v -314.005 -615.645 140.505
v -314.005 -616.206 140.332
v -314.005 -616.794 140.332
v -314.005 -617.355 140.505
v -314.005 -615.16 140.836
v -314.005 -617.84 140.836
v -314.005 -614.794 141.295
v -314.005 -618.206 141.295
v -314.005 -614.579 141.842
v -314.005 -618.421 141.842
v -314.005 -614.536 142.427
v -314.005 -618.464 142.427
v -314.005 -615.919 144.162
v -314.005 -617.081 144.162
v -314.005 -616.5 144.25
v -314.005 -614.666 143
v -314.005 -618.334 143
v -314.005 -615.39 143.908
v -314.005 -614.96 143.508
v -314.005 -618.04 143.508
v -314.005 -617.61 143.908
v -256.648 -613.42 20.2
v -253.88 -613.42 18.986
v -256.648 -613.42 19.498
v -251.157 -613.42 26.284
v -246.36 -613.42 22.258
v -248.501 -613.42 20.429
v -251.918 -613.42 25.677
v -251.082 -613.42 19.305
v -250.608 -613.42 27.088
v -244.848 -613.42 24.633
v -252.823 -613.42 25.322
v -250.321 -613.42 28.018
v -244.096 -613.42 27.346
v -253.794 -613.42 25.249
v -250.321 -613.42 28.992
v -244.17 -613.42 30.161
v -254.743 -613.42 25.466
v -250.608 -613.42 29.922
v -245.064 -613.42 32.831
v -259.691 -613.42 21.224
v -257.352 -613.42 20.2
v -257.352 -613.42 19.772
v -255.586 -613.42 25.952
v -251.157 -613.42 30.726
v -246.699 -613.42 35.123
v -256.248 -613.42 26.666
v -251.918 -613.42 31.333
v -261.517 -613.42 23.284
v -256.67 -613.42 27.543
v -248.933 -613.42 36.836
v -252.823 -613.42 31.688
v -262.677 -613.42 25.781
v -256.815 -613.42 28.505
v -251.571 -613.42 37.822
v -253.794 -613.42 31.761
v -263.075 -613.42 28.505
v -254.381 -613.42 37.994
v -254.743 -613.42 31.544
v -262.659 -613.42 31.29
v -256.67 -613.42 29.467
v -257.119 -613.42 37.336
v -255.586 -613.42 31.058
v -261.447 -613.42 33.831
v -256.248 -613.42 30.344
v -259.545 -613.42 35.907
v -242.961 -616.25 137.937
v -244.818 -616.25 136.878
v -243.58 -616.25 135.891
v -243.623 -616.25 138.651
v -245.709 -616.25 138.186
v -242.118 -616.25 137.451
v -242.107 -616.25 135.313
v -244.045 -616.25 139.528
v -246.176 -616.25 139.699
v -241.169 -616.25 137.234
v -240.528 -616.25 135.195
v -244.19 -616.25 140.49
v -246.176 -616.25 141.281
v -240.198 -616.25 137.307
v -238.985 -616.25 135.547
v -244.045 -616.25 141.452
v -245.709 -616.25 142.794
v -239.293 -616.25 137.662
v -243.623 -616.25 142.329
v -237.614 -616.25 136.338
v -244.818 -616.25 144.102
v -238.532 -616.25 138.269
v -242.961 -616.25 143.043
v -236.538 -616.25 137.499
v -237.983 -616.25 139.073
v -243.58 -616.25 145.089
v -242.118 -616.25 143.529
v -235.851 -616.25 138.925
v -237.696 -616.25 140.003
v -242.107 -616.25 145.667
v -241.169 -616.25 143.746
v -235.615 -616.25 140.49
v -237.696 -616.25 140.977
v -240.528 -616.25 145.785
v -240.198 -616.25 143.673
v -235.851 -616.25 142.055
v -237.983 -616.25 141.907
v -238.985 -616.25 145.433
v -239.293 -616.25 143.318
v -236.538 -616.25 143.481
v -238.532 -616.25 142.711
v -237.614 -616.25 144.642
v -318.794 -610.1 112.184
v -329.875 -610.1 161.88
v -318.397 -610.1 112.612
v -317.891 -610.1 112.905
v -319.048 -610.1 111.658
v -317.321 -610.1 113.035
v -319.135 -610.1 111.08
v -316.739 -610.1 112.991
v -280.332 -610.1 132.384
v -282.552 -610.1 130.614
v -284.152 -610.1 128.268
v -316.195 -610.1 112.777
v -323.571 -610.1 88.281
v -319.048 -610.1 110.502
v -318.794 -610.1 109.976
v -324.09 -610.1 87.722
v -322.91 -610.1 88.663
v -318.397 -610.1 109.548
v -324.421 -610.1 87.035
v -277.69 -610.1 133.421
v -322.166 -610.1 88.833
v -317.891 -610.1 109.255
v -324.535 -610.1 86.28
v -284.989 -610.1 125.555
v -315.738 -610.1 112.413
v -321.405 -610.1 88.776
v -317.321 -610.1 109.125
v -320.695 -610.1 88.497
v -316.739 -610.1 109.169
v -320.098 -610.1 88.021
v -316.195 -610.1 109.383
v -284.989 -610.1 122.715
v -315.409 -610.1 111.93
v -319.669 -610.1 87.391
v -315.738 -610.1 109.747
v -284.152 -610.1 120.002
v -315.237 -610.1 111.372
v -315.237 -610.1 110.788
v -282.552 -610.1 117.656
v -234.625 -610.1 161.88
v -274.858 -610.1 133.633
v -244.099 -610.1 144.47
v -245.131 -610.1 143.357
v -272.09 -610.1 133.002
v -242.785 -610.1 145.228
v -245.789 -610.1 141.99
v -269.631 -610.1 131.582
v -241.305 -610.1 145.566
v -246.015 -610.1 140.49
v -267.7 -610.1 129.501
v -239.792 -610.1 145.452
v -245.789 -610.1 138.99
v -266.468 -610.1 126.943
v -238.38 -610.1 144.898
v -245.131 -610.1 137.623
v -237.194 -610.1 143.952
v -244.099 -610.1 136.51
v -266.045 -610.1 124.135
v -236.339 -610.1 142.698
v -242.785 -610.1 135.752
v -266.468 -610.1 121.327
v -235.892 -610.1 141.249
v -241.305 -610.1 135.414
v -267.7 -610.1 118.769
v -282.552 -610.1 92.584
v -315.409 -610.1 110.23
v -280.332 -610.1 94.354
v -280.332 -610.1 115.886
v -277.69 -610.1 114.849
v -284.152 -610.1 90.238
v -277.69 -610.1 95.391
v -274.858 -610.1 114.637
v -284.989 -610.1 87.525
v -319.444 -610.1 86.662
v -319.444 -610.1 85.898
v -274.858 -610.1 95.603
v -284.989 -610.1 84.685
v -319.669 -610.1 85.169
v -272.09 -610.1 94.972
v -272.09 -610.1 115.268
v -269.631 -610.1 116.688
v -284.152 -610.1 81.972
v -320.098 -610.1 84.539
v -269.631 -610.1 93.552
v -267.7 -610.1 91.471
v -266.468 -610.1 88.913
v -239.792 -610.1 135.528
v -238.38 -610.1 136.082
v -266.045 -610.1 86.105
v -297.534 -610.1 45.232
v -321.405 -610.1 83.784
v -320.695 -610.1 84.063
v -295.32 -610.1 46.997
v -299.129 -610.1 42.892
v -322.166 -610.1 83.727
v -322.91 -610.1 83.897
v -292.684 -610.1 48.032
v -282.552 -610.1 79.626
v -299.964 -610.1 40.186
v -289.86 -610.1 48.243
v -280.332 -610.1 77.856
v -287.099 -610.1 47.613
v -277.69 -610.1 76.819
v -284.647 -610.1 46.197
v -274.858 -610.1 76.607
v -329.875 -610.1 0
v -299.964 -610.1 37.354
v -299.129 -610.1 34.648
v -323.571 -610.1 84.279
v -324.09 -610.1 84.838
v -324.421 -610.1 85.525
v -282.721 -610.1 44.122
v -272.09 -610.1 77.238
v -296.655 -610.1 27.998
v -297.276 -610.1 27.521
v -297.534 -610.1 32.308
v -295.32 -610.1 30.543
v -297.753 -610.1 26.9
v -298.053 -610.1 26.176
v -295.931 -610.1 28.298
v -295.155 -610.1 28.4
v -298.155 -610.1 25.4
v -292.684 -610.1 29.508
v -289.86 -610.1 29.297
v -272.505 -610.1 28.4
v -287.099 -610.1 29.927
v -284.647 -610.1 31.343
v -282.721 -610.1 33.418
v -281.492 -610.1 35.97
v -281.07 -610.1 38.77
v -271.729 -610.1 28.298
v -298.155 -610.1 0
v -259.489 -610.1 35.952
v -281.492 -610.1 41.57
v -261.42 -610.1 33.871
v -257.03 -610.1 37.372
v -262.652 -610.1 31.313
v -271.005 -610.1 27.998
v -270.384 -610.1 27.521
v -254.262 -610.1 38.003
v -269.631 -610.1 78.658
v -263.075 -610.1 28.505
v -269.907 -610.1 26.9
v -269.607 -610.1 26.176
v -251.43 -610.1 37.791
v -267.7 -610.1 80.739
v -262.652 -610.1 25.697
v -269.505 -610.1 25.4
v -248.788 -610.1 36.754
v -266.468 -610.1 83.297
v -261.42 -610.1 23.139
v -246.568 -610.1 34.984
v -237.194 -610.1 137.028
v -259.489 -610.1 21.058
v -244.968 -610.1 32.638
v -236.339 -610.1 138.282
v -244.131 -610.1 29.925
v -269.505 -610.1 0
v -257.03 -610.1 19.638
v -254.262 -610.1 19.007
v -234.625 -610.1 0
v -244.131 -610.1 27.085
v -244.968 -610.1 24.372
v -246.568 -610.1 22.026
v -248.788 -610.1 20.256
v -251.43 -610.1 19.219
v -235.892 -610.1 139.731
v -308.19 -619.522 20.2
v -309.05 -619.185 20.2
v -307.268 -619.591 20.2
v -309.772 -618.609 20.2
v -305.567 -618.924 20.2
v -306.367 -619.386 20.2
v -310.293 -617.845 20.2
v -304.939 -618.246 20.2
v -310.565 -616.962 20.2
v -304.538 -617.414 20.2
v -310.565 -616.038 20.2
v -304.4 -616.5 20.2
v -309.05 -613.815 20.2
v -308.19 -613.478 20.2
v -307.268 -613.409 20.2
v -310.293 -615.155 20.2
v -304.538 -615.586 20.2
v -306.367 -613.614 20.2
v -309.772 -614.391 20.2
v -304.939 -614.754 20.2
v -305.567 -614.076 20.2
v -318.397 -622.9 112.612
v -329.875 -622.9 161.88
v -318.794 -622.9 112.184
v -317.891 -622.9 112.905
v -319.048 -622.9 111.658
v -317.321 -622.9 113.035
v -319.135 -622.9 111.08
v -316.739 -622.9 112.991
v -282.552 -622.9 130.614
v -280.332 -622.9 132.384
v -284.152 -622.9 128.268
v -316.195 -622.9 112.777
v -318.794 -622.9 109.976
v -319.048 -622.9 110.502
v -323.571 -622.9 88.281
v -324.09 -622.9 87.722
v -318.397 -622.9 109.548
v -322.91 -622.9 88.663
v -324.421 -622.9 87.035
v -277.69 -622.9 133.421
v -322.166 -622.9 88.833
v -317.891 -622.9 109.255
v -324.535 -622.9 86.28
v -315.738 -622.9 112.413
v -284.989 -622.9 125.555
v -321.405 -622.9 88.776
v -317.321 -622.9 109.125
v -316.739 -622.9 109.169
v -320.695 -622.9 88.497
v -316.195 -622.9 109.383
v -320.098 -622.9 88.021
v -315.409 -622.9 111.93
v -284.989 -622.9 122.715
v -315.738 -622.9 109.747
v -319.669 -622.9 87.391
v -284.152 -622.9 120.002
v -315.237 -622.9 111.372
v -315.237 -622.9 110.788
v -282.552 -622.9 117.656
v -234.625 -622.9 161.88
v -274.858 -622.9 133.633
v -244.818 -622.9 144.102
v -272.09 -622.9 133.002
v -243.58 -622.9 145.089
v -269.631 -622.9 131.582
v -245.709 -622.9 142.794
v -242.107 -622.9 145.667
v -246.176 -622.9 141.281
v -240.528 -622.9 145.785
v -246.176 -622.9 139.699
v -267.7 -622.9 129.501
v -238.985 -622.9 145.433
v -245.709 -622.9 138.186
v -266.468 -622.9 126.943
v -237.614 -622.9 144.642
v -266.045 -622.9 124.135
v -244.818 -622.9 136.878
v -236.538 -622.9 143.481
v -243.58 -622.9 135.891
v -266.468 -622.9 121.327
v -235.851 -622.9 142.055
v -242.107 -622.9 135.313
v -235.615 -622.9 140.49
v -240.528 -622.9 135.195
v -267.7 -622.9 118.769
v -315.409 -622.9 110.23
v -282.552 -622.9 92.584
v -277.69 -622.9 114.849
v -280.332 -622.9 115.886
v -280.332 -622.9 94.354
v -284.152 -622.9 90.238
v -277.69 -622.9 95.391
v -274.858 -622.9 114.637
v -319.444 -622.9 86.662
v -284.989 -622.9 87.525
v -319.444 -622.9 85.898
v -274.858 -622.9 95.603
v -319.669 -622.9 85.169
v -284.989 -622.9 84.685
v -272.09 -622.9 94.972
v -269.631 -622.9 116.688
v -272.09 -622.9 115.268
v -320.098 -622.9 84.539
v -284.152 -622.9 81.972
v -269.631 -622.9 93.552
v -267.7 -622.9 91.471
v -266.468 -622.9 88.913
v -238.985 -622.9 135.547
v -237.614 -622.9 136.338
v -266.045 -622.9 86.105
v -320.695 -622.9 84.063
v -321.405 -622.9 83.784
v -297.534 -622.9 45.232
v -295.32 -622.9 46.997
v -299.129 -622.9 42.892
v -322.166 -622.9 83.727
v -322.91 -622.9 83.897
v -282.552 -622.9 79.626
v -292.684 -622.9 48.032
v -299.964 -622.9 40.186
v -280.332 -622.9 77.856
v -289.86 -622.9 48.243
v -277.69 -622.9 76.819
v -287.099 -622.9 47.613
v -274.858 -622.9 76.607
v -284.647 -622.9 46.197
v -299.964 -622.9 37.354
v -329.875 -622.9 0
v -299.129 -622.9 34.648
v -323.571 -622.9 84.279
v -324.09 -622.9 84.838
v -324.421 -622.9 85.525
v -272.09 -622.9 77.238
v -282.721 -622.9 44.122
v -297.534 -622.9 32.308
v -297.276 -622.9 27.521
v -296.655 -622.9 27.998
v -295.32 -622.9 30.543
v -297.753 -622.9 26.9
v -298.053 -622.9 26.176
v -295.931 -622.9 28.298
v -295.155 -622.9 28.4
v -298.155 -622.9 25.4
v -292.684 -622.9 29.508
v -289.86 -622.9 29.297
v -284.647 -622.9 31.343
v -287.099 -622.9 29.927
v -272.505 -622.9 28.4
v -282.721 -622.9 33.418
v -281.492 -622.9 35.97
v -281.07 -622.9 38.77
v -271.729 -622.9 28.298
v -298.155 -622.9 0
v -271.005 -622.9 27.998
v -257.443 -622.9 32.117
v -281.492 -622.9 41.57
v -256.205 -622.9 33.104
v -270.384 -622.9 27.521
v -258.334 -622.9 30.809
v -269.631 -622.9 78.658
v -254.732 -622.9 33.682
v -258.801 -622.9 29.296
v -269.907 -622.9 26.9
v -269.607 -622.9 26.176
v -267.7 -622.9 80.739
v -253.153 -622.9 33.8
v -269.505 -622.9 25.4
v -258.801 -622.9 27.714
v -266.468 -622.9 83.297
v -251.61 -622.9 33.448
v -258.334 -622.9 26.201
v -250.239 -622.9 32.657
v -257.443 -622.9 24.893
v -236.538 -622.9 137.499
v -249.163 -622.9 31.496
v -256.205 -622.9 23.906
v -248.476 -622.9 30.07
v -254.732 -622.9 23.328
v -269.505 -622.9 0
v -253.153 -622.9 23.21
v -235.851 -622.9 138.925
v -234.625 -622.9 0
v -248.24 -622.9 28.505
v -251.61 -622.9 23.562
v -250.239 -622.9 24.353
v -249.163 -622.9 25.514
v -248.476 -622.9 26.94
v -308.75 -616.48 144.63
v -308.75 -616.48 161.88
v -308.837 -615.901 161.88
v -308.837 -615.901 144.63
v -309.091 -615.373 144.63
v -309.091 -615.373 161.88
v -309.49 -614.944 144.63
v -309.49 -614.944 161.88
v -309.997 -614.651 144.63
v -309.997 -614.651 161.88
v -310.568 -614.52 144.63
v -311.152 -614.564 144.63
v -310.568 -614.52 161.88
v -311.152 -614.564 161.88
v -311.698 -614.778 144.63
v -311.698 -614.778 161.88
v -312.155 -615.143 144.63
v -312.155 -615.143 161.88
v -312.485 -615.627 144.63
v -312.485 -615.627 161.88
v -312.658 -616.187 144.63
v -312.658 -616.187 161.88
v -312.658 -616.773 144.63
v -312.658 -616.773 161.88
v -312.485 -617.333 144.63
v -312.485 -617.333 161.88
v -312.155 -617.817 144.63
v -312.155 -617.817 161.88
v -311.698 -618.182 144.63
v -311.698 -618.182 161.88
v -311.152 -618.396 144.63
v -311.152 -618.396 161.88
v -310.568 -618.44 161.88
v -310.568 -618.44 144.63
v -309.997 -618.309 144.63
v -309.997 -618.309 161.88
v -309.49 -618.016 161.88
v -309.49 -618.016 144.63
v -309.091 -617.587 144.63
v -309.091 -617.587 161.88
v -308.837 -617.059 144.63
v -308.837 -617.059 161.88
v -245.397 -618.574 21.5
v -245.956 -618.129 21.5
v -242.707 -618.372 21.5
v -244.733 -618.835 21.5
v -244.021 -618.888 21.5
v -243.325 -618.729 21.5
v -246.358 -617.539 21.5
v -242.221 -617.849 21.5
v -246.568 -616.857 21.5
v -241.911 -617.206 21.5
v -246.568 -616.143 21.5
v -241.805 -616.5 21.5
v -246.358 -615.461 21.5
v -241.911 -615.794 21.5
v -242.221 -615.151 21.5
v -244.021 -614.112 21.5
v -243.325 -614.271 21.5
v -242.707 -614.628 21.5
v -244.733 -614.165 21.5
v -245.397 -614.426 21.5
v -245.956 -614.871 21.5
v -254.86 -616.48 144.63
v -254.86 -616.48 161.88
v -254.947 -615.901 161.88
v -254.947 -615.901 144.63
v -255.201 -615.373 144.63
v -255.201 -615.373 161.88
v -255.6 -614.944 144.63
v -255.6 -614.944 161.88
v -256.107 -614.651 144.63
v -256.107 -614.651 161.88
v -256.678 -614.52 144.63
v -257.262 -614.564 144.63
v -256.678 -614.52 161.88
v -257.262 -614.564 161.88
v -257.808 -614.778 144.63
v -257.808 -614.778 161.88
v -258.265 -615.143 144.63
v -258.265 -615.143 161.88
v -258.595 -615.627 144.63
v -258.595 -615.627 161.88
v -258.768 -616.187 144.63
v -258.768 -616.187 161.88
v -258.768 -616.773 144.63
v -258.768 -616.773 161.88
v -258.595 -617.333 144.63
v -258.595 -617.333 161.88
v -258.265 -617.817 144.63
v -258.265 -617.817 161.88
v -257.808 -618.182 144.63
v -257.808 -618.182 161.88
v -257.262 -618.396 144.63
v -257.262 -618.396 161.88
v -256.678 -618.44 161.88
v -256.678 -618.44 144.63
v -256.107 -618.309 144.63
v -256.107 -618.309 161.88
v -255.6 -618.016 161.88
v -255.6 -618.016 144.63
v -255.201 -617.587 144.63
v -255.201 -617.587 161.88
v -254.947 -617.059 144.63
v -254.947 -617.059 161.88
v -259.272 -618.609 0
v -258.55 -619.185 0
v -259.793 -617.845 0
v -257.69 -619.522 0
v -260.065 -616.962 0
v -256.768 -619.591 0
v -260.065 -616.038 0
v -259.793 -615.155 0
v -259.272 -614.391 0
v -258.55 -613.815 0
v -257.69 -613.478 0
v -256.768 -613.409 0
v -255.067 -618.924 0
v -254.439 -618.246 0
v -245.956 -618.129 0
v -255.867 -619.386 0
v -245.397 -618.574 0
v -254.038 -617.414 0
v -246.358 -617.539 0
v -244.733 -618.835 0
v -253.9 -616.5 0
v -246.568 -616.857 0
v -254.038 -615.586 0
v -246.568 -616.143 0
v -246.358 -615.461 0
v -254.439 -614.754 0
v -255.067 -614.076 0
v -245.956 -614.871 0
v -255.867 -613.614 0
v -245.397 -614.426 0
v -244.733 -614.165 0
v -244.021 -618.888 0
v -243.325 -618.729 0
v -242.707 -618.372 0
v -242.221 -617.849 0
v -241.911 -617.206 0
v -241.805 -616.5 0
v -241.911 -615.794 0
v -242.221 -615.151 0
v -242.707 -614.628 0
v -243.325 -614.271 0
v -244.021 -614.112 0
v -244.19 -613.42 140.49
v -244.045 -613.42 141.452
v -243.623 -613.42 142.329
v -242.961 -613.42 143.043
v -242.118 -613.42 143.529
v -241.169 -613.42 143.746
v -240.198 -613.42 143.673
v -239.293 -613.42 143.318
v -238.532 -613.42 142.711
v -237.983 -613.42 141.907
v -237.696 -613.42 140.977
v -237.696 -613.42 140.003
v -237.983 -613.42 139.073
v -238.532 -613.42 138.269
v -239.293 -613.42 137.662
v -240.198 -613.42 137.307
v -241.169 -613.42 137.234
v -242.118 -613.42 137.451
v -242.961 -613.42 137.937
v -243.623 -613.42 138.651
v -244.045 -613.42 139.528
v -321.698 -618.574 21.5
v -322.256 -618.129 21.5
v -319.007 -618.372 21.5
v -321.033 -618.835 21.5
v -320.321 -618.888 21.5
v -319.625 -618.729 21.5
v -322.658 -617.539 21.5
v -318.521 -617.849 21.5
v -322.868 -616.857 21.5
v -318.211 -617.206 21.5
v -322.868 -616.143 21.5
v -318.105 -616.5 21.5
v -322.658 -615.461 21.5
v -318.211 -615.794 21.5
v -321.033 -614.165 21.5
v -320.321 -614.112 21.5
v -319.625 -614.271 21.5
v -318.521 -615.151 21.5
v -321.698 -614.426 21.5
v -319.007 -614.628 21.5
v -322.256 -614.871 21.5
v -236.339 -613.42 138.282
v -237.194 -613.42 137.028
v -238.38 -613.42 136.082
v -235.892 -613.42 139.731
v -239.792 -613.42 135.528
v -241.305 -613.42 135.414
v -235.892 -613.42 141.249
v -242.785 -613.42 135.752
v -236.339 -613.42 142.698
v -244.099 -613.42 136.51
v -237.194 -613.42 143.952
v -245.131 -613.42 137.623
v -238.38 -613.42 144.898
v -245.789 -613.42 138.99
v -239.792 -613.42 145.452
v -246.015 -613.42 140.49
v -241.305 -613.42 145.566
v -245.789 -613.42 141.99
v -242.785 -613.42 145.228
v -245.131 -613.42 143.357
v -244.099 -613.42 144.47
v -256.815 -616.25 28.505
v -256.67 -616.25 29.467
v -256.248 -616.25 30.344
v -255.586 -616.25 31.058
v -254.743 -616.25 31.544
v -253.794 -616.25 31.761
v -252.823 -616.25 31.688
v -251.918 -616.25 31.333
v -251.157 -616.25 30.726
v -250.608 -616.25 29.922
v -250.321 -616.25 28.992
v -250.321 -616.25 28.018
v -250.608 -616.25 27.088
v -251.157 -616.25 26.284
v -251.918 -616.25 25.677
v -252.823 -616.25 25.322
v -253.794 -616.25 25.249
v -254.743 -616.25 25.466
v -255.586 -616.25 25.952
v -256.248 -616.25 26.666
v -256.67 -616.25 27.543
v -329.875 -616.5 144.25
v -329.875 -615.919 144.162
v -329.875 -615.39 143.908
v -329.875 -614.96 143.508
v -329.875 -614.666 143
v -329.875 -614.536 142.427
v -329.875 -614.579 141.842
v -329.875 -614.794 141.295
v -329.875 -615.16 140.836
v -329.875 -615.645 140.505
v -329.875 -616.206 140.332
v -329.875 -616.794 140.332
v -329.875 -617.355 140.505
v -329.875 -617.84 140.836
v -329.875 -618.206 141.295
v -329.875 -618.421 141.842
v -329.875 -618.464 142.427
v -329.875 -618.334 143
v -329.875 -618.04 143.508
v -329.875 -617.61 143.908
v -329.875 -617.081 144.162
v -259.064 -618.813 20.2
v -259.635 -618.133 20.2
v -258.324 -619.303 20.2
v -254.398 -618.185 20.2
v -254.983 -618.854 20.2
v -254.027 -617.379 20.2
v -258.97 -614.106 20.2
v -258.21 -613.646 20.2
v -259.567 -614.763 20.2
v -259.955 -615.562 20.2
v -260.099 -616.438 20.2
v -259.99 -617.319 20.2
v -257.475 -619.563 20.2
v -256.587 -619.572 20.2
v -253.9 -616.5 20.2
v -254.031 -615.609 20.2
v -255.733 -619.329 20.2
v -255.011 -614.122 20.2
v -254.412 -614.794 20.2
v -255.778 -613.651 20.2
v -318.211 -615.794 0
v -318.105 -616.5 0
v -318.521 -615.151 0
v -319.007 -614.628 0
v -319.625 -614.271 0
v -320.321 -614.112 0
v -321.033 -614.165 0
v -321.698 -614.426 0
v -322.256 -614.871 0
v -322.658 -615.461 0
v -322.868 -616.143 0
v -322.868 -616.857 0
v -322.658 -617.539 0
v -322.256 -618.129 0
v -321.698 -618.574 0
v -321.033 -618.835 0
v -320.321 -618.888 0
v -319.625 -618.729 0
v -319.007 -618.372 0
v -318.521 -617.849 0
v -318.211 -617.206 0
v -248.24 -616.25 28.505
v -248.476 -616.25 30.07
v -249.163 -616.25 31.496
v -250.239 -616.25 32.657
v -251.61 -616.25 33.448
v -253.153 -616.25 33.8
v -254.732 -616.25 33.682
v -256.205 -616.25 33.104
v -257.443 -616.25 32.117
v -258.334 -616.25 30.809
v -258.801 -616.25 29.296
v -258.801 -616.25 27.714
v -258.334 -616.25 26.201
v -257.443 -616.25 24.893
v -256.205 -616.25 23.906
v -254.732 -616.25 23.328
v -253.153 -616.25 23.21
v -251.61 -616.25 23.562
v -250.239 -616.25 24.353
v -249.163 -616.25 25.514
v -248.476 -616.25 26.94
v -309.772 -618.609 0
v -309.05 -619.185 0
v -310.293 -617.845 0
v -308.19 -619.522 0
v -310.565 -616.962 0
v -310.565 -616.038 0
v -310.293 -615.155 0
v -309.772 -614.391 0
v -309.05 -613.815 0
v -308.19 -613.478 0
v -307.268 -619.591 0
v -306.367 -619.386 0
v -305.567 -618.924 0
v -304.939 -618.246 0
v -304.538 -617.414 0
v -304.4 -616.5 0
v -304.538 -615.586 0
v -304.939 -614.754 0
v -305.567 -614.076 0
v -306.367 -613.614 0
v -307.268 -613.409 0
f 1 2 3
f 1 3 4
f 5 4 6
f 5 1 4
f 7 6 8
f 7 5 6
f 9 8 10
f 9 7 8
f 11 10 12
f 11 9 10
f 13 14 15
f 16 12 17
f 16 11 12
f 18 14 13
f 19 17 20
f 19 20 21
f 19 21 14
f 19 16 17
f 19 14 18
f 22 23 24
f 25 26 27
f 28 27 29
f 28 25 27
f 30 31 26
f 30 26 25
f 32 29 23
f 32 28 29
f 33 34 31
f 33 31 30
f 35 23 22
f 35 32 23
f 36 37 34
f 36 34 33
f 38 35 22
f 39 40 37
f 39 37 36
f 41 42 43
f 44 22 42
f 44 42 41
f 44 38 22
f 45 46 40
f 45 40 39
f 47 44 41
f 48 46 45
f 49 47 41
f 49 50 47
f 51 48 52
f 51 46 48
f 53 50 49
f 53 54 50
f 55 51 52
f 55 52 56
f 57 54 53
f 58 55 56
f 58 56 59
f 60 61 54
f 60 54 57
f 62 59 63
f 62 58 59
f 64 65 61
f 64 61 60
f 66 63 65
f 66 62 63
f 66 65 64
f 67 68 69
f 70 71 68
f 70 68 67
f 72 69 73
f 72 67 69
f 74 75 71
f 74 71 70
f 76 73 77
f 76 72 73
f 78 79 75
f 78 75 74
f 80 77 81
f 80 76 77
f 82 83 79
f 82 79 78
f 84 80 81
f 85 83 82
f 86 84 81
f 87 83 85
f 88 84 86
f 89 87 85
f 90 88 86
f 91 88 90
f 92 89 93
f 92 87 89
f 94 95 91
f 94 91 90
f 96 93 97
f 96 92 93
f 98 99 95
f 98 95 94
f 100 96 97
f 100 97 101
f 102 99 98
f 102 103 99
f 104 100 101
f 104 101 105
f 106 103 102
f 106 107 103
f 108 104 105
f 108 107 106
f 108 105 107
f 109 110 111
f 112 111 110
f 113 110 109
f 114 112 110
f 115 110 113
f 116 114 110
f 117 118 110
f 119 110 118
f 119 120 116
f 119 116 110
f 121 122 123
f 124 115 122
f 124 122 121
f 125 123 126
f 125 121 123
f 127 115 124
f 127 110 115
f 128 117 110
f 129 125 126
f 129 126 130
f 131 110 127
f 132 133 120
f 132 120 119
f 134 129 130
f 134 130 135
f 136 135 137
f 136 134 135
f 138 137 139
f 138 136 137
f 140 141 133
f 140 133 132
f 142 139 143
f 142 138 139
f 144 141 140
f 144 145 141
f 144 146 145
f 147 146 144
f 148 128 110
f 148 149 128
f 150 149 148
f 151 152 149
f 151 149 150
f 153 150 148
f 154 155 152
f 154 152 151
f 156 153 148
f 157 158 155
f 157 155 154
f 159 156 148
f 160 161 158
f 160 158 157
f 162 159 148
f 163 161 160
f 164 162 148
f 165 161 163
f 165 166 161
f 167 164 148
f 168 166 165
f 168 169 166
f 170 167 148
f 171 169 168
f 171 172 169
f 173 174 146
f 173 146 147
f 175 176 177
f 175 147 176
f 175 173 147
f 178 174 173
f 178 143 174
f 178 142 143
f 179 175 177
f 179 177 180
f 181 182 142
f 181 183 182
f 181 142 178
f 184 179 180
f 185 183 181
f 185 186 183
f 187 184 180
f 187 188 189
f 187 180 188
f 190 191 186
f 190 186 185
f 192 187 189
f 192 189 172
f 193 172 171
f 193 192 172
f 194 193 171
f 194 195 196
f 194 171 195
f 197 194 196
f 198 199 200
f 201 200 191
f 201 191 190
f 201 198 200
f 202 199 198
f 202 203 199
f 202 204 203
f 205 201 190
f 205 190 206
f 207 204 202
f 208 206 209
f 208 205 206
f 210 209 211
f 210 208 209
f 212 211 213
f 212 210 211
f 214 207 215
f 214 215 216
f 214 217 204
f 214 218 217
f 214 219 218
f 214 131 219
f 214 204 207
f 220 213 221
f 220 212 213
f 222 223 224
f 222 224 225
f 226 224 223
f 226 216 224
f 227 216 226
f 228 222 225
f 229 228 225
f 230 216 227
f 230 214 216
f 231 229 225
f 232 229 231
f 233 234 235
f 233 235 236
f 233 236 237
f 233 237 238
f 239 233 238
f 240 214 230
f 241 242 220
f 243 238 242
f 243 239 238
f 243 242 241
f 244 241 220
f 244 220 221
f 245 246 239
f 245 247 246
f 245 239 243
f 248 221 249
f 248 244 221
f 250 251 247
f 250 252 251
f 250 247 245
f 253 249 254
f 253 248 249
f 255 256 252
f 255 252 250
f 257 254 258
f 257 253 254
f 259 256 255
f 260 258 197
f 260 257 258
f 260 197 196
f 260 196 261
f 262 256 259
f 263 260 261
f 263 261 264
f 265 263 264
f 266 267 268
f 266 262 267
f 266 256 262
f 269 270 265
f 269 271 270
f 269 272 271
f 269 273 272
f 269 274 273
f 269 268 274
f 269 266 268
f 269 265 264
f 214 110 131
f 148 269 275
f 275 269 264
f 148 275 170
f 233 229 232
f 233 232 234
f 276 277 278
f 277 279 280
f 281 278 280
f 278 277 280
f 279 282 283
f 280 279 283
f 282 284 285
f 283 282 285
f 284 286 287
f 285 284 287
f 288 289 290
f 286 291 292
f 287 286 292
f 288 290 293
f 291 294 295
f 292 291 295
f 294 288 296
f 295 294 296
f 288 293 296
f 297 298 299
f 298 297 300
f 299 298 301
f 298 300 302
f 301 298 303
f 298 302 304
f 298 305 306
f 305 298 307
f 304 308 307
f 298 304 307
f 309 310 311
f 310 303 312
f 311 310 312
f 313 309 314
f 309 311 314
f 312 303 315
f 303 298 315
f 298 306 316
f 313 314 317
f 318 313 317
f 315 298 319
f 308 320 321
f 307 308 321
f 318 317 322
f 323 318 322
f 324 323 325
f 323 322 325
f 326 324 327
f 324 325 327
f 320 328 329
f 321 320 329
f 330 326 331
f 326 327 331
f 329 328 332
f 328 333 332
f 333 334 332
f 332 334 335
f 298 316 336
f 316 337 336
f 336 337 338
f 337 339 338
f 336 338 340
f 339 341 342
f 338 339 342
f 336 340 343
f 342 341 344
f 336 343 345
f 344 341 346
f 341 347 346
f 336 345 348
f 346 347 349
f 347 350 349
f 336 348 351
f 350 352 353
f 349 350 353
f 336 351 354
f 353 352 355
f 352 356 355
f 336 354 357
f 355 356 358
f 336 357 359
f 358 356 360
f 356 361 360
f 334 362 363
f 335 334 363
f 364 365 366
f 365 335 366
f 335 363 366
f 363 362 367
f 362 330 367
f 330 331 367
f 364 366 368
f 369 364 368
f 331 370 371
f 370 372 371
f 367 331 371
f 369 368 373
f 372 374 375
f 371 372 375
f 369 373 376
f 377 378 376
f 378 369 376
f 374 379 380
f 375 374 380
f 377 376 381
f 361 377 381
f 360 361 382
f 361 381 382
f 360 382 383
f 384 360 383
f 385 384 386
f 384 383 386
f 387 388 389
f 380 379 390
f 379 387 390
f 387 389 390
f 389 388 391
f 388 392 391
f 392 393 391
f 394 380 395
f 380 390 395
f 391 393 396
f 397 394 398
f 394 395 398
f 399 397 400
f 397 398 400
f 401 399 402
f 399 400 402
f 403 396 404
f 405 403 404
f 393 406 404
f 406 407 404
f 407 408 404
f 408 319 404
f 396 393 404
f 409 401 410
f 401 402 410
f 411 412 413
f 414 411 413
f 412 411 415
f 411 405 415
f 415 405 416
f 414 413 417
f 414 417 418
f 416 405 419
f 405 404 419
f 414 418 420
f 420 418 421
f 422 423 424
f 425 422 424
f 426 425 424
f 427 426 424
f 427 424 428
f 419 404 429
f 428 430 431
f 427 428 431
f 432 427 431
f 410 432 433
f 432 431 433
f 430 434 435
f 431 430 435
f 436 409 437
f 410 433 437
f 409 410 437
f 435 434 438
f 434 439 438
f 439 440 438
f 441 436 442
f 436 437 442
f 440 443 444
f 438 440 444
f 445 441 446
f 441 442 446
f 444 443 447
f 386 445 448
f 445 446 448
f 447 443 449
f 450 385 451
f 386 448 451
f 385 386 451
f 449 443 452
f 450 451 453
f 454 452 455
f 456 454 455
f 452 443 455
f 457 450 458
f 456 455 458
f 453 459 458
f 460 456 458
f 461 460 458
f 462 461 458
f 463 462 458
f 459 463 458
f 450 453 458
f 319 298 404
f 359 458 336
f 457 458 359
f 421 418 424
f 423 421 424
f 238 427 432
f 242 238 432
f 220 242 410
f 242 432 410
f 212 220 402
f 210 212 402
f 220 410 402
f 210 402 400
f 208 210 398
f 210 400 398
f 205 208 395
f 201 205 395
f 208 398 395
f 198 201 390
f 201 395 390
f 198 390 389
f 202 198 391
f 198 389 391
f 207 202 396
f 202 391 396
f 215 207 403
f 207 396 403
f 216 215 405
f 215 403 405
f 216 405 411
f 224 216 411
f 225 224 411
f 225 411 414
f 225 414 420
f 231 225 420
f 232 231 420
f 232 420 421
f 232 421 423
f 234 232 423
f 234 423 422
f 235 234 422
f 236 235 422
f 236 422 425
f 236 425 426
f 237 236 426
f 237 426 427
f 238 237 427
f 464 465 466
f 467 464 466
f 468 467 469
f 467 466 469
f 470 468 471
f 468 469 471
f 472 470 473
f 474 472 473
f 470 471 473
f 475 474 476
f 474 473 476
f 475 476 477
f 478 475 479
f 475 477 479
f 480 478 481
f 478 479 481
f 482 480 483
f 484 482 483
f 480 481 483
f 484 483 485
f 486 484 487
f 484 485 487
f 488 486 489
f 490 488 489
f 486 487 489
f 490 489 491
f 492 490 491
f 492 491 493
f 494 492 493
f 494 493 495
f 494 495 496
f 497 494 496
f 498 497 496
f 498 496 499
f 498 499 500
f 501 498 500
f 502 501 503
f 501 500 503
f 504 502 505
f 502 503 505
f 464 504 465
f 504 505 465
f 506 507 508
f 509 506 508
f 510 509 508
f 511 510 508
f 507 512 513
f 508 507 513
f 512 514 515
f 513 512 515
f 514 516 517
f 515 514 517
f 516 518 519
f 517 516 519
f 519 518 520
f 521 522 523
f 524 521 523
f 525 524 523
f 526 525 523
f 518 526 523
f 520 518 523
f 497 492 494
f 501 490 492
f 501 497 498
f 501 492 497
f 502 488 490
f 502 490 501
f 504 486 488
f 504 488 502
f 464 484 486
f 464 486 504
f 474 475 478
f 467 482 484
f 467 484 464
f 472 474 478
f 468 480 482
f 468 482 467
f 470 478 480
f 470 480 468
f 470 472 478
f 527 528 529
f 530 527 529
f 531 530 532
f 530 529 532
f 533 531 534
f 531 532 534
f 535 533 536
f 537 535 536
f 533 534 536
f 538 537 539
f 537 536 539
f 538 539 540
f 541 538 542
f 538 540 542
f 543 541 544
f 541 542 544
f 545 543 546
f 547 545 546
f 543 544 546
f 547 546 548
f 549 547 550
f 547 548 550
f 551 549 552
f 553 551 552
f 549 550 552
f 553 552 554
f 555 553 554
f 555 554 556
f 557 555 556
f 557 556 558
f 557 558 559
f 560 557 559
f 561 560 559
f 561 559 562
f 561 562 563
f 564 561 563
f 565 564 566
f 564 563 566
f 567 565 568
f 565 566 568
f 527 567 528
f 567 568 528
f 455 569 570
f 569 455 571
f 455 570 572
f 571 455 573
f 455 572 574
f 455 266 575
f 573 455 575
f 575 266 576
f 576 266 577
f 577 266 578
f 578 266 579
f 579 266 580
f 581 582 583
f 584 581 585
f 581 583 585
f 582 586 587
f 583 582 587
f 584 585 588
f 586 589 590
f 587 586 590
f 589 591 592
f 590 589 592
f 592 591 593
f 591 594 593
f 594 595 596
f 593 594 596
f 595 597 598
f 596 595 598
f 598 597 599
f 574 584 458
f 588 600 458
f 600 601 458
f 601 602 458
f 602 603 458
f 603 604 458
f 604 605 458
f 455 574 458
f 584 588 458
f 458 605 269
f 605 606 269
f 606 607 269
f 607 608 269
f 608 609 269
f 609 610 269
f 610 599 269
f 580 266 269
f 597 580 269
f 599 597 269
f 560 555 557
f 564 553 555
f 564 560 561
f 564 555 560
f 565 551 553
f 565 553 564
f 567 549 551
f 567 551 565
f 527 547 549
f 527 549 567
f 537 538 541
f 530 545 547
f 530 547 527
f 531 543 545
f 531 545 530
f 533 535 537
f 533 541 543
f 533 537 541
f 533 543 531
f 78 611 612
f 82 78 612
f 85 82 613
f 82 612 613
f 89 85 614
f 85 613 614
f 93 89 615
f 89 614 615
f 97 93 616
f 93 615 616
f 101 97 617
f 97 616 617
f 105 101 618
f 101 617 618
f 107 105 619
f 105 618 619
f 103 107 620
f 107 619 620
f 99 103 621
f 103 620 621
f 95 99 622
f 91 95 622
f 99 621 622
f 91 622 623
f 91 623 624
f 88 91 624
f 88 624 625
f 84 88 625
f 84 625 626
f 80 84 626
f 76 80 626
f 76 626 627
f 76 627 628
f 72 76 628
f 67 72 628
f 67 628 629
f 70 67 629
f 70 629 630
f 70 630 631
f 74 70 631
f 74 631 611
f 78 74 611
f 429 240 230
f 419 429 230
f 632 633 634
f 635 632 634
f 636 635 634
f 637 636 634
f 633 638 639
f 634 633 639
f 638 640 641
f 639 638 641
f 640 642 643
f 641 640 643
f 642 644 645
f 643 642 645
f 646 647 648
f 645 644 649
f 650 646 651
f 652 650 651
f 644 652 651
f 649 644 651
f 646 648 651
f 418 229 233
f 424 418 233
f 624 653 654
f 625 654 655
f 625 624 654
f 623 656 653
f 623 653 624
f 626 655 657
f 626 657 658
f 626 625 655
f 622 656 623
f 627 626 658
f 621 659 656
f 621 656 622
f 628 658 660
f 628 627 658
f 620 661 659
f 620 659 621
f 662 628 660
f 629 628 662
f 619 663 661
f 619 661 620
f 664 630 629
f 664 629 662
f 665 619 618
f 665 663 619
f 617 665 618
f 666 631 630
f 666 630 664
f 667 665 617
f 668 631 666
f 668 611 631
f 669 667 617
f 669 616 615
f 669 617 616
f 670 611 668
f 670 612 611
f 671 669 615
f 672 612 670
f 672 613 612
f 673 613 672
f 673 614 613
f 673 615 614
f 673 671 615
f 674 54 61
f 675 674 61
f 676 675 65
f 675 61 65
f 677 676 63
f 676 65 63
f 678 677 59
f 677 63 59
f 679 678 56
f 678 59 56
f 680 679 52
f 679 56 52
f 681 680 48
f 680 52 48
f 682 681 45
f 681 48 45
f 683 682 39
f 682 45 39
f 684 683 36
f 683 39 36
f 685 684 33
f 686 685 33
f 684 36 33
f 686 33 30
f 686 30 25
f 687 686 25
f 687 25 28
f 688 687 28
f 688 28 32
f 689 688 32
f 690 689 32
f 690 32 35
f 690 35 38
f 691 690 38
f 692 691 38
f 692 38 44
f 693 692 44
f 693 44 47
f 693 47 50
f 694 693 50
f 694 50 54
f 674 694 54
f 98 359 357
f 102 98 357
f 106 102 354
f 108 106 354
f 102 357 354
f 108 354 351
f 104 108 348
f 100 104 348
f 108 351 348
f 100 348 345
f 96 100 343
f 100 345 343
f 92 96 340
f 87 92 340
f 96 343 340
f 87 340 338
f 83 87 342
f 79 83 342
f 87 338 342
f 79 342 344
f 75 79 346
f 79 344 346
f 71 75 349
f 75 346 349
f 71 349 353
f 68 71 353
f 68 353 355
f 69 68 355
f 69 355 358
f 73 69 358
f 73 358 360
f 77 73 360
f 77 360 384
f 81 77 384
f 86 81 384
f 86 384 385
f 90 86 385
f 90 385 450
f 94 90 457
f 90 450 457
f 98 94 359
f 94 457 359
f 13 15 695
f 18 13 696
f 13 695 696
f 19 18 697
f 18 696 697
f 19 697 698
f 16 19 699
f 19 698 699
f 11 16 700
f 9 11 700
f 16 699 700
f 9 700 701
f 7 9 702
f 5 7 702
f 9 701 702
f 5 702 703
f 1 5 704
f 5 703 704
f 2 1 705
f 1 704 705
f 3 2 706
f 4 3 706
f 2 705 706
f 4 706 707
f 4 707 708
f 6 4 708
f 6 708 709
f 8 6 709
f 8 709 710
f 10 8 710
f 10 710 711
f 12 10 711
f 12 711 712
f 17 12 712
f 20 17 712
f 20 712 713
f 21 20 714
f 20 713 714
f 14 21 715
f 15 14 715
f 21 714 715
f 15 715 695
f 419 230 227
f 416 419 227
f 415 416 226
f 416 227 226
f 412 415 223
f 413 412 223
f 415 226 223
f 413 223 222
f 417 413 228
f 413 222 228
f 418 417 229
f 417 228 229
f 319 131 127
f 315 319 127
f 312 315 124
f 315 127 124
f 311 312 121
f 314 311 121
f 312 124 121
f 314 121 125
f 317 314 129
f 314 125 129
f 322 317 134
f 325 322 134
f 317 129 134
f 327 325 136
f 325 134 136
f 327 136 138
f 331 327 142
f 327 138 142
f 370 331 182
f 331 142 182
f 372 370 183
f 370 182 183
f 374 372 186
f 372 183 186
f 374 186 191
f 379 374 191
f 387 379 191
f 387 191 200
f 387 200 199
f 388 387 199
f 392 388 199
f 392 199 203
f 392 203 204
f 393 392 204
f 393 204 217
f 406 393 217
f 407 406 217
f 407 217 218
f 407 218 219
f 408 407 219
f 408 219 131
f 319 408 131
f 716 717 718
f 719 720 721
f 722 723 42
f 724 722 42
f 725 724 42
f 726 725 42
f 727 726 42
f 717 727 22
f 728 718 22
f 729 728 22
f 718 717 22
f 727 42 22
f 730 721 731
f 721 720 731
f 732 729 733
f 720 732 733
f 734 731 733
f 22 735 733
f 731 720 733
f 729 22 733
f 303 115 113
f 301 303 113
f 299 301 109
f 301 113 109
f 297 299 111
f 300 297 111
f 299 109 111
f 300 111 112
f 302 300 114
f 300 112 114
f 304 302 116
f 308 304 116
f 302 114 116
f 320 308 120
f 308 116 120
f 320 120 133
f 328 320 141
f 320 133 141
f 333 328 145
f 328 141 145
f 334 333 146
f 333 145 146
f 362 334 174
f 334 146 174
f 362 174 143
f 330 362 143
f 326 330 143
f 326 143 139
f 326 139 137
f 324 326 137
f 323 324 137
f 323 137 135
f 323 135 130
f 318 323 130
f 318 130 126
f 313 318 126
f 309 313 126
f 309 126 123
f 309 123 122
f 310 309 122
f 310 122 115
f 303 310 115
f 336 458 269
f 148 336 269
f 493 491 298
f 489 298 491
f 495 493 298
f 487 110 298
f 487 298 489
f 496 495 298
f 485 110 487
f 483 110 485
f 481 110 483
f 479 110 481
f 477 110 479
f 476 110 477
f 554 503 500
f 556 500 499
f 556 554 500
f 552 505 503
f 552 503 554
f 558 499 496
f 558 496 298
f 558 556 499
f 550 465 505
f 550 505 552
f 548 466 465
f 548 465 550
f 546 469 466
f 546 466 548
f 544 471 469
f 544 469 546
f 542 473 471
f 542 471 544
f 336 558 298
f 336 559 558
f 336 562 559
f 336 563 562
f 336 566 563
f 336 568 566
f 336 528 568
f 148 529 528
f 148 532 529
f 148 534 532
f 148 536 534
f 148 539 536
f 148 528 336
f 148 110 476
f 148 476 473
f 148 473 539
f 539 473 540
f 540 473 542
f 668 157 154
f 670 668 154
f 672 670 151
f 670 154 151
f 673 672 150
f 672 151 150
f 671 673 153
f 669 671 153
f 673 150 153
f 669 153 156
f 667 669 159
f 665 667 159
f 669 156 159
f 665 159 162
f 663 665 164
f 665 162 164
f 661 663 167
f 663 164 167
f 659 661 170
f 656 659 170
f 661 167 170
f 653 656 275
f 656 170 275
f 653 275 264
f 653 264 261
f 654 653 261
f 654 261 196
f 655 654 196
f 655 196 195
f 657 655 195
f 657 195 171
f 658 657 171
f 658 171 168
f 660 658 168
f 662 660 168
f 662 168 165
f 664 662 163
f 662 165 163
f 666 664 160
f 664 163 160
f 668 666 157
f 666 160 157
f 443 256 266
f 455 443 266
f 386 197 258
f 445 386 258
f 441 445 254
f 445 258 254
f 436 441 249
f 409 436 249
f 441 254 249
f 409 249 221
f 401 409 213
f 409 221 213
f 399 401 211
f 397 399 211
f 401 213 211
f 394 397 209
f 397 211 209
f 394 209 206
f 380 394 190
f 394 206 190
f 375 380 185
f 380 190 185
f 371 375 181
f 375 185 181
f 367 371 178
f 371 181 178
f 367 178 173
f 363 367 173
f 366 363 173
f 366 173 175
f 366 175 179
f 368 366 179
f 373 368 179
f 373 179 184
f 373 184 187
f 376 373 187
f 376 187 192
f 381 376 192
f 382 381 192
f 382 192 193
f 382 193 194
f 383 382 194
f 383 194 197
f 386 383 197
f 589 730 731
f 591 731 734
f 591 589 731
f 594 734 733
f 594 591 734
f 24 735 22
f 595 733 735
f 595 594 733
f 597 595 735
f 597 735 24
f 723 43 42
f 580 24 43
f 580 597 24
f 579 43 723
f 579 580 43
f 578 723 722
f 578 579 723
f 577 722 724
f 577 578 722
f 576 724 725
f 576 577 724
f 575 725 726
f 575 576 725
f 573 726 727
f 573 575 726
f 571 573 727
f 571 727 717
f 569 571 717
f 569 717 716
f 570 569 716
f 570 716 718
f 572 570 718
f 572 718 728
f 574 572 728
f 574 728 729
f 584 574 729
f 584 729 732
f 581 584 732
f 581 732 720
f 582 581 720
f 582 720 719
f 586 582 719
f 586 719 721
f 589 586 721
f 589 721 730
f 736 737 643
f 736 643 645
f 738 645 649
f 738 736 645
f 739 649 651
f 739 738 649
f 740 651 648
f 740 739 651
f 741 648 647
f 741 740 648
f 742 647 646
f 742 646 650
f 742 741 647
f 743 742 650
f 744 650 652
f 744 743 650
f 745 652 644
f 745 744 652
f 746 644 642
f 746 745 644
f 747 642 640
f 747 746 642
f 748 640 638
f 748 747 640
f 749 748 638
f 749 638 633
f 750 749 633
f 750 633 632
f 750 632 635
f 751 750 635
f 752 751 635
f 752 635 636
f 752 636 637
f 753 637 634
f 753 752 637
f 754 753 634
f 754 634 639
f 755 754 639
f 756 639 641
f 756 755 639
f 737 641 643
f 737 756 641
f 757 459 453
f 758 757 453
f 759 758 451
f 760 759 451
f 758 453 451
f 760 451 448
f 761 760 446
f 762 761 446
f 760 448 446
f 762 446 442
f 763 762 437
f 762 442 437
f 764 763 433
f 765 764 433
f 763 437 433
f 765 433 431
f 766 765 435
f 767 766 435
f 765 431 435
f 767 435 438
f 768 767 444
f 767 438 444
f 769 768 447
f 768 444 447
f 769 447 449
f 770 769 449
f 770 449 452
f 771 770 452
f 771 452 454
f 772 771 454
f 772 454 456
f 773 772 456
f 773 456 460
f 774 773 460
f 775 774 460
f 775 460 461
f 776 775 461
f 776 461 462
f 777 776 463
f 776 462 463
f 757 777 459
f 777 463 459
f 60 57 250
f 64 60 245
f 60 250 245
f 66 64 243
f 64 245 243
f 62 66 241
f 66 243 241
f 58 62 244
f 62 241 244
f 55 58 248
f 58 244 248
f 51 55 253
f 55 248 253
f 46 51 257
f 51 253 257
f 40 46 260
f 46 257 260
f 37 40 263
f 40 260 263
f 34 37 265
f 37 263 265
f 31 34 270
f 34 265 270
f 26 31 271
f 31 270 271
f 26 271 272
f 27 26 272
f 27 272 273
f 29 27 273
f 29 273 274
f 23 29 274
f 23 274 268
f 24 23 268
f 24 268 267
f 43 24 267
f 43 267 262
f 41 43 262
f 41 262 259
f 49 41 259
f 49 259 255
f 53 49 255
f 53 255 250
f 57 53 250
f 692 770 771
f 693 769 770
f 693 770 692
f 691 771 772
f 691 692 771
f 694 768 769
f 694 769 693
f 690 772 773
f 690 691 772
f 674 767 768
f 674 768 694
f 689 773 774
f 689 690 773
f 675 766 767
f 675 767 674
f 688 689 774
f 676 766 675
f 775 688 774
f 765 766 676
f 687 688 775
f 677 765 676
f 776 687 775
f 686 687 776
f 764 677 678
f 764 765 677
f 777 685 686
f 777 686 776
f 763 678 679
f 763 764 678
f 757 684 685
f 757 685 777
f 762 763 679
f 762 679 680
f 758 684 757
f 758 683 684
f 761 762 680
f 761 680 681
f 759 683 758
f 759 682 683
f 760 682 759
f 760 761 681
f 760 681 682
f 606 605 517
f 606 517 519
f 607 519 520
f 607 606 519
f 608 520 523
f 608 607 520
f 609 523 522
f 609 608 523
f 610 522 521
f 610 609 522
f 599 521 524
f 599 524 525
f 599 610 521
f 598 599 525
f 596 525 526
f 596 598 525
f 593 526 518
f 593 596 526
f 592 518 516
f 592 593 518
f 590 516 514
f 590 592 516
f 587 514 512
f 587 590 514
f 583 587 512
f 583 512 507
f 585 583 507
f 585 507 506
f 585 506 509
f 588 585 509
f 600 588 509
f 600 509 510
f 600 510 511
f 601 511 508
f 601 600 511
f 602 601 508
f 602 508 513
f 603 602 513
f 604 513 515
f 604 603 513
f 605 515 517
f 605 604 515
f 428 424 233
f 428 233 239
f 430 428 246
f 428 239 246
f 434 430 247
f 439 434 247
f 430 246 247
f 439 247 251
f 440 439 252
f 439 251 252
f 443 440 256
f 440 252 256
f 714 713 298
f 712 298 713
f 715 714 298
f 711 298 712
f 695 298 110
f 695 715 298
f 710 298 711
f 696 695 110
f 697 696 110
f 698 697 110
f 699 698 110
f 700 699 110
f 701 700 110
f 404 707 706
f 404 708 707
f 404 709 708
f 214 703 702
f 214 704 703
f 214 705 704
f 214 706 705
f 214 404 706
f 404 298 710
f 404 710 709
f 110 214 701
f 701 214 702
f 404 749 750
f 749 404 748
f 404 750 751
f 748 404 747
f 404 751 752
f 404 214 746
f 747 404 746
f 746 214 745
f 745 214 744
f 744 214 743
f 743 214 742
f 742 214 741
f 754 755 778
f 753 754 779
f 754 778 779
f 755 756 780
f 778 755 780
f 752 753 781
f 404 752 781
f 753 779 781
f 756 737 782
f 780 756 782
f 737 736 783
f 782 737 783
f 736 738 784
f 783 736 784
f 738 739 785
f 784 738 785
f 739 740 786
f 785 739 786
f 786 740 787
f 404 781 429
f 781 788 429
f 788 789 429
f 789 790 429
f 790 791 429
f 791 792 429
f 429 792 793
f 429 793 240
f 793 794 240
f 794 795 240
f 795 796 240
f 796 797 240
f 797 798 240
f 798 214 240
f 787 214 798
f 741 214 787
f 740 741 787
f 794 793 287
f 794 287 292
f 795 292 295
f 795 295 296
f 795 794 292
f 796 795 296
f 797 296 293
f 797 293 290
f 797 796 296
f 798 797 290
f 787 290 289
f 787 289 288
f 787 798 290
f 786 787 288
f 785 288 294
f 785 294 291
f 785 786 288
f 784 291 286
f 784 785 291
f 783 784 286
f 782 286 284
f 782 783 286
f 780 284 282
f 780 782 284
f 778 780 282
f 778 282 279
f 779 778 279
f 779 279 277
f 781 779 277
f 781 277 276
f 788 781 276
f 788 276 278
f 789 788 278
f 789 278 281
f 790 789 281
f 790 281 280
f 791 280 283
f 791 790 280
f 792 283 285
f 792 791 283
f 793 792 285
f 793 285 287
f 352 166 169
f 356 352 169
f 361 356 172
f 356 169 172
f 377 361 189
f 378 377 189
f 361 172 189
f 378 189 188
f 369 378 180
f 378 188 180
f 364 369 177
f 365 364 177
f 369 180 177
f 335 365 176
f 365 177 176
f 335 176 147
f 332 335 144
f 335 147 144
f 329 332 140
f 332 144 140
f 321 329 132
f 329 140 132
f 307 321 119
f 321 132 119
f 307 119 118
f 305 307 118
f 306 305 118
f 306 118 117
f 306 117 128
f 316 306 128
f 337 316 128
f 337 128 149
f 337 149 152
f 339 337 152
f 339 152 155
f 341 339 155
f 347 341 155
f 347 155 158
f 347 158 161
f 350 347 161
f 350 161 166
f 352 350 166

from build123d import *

# Parameters (mm, degrees)
SKETCH1_W           = 95.25
SKETCH1_H           = 12.8
BOSS_EXTRUDE1_DEPTH = 161.88
SKETCH1_3_R         = 3.1
CUT_EXTRUDE1_DEPTH  = 20.2
SKETCH1_4_R         = 2.395
CUT_EXTRUDE2_DEPTH  = 21.5
CUT_EXTRUDE3_REACH  = 369.677
SKETCH2_R           = 9.525
CUT_EXTRUDE4_REACH  = 369.677
SKETCH3_R           = 3.265
SKETCH3_R_2         = 1.96
SKETCH3_R_3         = 2.56
SKETCH4_R           = 9.525
SKETCH4_R_2         = 5.09
CUT_EXTRUDE5_DEPTH  = 3.32
SKETCH5_R           = 5.31
CUT_EXTRUDE6_DEPTH  = 6.65
SKETCH6_R           = 1.965
CUT_EXTRUDE7_DEPTH  = 17.25
SKETCH7_R           = 1.97
CUT_EXTRUDE8_DEPTH  = 15.87
SKETCH9_R           = 9.5
CUT_EXTRUDE9_DEPTH  = 368.677154617


with BuildPart() as part:
    # Sketch1 → Boss-Extrude1 (new body)
    with BuildSketch(Plane.XY):
        with Locations((-282.25, -616.5)):
            Rectangle(SKETCH1_W, SKETCH1_H)
    extrude(amount=BOSS_EXTRUDE1_DEPTH)

    # Sketch1<3> → Cut-Extrude1 (cut)
    with BuildSketch(Plane.XY):
        with Locations((-257, -616.5)):
            Circle(SKETCH1_3_R)
        with Locations((-307.5, -616.5)):
            Circle(SKETCH1_3_R)
    extrude(amount=CUT_EXTRUDE1_DEPTH, mode=Mode.SUBTRACT)

    # Sketch1<4> → Cut-Extrude2 (cut)
    with BuildSketch(Plane.XY):
        with Locations((-244.2, -616.5)):
            Circle(SKETCH1_4_R)
        with Locations((-320.5, -616.5)):
            Circle(SKETCH1_4_R)
    extrude(amount=CUT_EXTRUDE2_DEPTH, mode=Mode.SUBTRACT)

    # Sketch2 → Cut-Extrude3 (cut, up to next)
    with BuildSketch(Plane(origin=(0, -610.1, 0), x_dir=(1, 0, 0), z_dir=(0, 1, 0)), mode=Mode.PRIVATE) as cut_extrude3_sk1:
        with Locations((-275.57, -124.135)):
            Circle(SKETCH2_R)
    cut_extrude3_tool1 = extrude(cut_extrude3_sk1.sketch, amount=-CUT_EXTRUDE3_REACH, mode=Mode.PRIVATE) & part.part
    # Sketch2 → Cut-Extrude3 (cut, up to next)
    with BuildSketch(Plane(origin=(0, -610.1, 0), x_dir=(1, 0, 0), z_dir=(0, 1, 0)), mode=Mode.PRIVATE) as cut_extrude3_sk2:
        with Locations((-275.57, -86.105)):
            Circle(SKETCH2_R)
    cut_extrude3_tool2 = extrude(cut_extrude3_sk2.sketch, amount=-CUT_EXTRUDE3_REACH, mode=Mode.PRIVATE) & part.part
    # Sketch2 → Cut-Extrude3 (cut, up to next)
    with BuildSketch(Plane(origin=(0, -610.1, 0), x_dir=(1, 0, 0), z_dir=(0, 1, 0)), mode=Mode.PRIVATE) as cut_extrude3_sk3:
        with BuildLine():
            Line((-269.505, 0), (-298.155, 0))
            Line((-298.155, 0), (-298.155, -25.4))
            ThreePointArc((-298.155, -25.4), (-297.276320344, -27.521320344), (-295.155, -28.4))
            Line((-295.155, -28.4), (-272.505, -28.4))
            ThreePointArc((-272.505, -28.4), (-270.383679656, -27.521320344), (-269.505, -25.4))
            Line((-269.505, -25.4), (-269.505, 0))
        make_face()
    cut_extrude3_tool3 = extrude(cut_extrude3_sk3.sketch, amount=-CUT_EXTRUDE3_REACH, mode=Mode.PRIVATE) & part.part
    add(cut_extrude3_tool1.solids().sort_by_distance((-275.57, -610.1, 124.135))[0], mode=Mode.SUBTRACT)
    add(cut_extrude3_tool2.solids().sort_by_distance((-275.57, -610.1, 86.105))[0], mode=Mode.SUBTRACT)
    add(cut_extrude3_tool3.solids().sort_by_distance((-283.83, -610.1, 14.135461))[0], mode=Mode.SUBTRACT)

    # Sketch3 → Cut-Extrude4 (cut, up to next)
    with BuildSketch(Plane(origin=(0, -610.1, 0), x_dir=(-1, 0, 0), z_dir=(0, 1, 0)), mode=Mode.PRIVATE) as cut_extrude4_sk1:
        with Locations((240.925, 140.49)):
            Circle(SKETCH3_R)
    cut_extrude4_tool1 = extrude(cut_extrude4_sk1.sketch, amount=-CUT_EXTRUDE4_REACH, mode=Mode.PRIVATE) & part.part
    # Sketch3 → Cut-Extrude4 (cut, up to next)
    with BuildSketch(Plane(origin=(0, -610.1, 0), x_dir=(-1, 0, 0), z_dir=(0, 1, 0)), mode=Mode.PRIVATE) as cut_extrude4_sk2:
        with Locations((253.55, 28.505)):
            Circle(SKETCH3_R)
    cut_extrude4_tool2 = extrude(cut_extrude4_sk2.sketch, amount=-CUT_EXTRUDE4_REACH, mode=Mode.PRIVATE) & part.part
    # Sketch3 → Cut-Extrude4 (cut, up to next)
    with BuildSketch(Plane(origin=(0, -610.1, 0), x_dir=(-1, 0, 0), z_dir=(0, 1, 0)), mode=Mode.PRIVATE) as cut_extrude4_sk3:
        with Locations((317.175, 111.08)):
            Circle(SKETCH3_R_2)
    cut_extrude4_tool3 = extrude(cut_extrude4_sk3.sketch, amount=-CUT_EXTRUDE4_REACH, mode=Mode.PRIVATE) & part.part
    # Sketch3 → Cut-Extrude4 (cut, up to next)
    with BuildSketch(Plane(origin=(0, -610.1, 0), x_dir=(-1, 0, 0), z_dir=(0, 1, 0)), mode=Mode.PRIVATE) as cut_extrude4_sk4:
        with Locations((321.975, 86.28)):
            Circle(SKETCH3_R_3)
    cut_extrude4_tool4 = extrude(cut_extrude4_sk4.sketch, amount=-CUT_EXTRUDE4_REACH, mode=Mode.PRIVATE) & part.part
    add(cut_extrude4_tool1.solids().sort_by_distance((-240.925, -610.1, 140.49))[0], mode=Mode.SUBTRACT)
    add(cut_extrude4_tool2.solids().sort_by_distance((-253.55, -610.1, 28.505))[0], mode=Mode.SUBTRACT)
    add(cut_extrude4_tool3.solids().sort_by_distance((-317.175, -610.1, 111.08))[0], mode=Mode.SUBTRACT)
    add(cut_extrude4_tool4.solids().sort_by_distance((-321.975, -610.1, 86.28))[0], mode=Mode.SUBTRACT)

    # Sketch4 → Cut-Extrude5 (cut)
    with BuildSketch(Plane(origin=(0, -610.1, 0), x_dir=(-1, 0, 0), z_dir=(0, 1, 0))):
        with Locations((253.55, 28.505)):
            Circle(SKETCH4_R)
        with Locations((240.925, 140.49)):
            Circle(SKETCH4_R_2)
    extrude(amount=-CUT_EXTRUDE5_DEPTH, mode=Mode.SUBTRACT)

    # Sketch5 → Cut-Extrude6 (cut)
    with BuildSketch(Plane.XZ.offset(622.9)):
        with Locations((-240.925, 140.49)):
            Circle(SKETCH5_R)
        with Locations((-253.55, 28.505)):
            Circle(SKETCH5_R)
    extrude(amount=-CUT_EXTRUDE6_DEPTH, mode=Mode.SUBTRACT)

    # Sketch6 → Cut-Extrude7 (cut)
    with BuildSketch(Plane.XY.offset(161.88)):
        with Locations((-310.715, -616.48)):
            Circle(SKETCH6_R)
        with Locations((-256.825, -616.48)):
            Circle(SKETCH6_R)
    extrude(amount=-CUT_EXTRUDE7_DEPTH, mode=Mode.SUBTRACT)

    # Sketch7 → Cut-Extrude8 (cut)
    with BuildSketch(Plane.ZY.offset(329.875)):
        with Locations((142.28, -616.5)):
            Circle(SKETCH7_R)
    extrude(amount=-CUT_EXTRUDE8_DEPTH, mode=Mode.SUBTRACT)

    # Sketch9 → Cut-Extrude9 (cut, through all)
    with BuildSketch(Plane.XZ.offset(622.9)):
        with Locations((-290.57, 38.77)):
            Circle(SKETCH9_R)
    extrude(amount=-CUT_EXTRUDE9_DEPTH, mode=Mode.SUBTRACT)


solid = part.part
